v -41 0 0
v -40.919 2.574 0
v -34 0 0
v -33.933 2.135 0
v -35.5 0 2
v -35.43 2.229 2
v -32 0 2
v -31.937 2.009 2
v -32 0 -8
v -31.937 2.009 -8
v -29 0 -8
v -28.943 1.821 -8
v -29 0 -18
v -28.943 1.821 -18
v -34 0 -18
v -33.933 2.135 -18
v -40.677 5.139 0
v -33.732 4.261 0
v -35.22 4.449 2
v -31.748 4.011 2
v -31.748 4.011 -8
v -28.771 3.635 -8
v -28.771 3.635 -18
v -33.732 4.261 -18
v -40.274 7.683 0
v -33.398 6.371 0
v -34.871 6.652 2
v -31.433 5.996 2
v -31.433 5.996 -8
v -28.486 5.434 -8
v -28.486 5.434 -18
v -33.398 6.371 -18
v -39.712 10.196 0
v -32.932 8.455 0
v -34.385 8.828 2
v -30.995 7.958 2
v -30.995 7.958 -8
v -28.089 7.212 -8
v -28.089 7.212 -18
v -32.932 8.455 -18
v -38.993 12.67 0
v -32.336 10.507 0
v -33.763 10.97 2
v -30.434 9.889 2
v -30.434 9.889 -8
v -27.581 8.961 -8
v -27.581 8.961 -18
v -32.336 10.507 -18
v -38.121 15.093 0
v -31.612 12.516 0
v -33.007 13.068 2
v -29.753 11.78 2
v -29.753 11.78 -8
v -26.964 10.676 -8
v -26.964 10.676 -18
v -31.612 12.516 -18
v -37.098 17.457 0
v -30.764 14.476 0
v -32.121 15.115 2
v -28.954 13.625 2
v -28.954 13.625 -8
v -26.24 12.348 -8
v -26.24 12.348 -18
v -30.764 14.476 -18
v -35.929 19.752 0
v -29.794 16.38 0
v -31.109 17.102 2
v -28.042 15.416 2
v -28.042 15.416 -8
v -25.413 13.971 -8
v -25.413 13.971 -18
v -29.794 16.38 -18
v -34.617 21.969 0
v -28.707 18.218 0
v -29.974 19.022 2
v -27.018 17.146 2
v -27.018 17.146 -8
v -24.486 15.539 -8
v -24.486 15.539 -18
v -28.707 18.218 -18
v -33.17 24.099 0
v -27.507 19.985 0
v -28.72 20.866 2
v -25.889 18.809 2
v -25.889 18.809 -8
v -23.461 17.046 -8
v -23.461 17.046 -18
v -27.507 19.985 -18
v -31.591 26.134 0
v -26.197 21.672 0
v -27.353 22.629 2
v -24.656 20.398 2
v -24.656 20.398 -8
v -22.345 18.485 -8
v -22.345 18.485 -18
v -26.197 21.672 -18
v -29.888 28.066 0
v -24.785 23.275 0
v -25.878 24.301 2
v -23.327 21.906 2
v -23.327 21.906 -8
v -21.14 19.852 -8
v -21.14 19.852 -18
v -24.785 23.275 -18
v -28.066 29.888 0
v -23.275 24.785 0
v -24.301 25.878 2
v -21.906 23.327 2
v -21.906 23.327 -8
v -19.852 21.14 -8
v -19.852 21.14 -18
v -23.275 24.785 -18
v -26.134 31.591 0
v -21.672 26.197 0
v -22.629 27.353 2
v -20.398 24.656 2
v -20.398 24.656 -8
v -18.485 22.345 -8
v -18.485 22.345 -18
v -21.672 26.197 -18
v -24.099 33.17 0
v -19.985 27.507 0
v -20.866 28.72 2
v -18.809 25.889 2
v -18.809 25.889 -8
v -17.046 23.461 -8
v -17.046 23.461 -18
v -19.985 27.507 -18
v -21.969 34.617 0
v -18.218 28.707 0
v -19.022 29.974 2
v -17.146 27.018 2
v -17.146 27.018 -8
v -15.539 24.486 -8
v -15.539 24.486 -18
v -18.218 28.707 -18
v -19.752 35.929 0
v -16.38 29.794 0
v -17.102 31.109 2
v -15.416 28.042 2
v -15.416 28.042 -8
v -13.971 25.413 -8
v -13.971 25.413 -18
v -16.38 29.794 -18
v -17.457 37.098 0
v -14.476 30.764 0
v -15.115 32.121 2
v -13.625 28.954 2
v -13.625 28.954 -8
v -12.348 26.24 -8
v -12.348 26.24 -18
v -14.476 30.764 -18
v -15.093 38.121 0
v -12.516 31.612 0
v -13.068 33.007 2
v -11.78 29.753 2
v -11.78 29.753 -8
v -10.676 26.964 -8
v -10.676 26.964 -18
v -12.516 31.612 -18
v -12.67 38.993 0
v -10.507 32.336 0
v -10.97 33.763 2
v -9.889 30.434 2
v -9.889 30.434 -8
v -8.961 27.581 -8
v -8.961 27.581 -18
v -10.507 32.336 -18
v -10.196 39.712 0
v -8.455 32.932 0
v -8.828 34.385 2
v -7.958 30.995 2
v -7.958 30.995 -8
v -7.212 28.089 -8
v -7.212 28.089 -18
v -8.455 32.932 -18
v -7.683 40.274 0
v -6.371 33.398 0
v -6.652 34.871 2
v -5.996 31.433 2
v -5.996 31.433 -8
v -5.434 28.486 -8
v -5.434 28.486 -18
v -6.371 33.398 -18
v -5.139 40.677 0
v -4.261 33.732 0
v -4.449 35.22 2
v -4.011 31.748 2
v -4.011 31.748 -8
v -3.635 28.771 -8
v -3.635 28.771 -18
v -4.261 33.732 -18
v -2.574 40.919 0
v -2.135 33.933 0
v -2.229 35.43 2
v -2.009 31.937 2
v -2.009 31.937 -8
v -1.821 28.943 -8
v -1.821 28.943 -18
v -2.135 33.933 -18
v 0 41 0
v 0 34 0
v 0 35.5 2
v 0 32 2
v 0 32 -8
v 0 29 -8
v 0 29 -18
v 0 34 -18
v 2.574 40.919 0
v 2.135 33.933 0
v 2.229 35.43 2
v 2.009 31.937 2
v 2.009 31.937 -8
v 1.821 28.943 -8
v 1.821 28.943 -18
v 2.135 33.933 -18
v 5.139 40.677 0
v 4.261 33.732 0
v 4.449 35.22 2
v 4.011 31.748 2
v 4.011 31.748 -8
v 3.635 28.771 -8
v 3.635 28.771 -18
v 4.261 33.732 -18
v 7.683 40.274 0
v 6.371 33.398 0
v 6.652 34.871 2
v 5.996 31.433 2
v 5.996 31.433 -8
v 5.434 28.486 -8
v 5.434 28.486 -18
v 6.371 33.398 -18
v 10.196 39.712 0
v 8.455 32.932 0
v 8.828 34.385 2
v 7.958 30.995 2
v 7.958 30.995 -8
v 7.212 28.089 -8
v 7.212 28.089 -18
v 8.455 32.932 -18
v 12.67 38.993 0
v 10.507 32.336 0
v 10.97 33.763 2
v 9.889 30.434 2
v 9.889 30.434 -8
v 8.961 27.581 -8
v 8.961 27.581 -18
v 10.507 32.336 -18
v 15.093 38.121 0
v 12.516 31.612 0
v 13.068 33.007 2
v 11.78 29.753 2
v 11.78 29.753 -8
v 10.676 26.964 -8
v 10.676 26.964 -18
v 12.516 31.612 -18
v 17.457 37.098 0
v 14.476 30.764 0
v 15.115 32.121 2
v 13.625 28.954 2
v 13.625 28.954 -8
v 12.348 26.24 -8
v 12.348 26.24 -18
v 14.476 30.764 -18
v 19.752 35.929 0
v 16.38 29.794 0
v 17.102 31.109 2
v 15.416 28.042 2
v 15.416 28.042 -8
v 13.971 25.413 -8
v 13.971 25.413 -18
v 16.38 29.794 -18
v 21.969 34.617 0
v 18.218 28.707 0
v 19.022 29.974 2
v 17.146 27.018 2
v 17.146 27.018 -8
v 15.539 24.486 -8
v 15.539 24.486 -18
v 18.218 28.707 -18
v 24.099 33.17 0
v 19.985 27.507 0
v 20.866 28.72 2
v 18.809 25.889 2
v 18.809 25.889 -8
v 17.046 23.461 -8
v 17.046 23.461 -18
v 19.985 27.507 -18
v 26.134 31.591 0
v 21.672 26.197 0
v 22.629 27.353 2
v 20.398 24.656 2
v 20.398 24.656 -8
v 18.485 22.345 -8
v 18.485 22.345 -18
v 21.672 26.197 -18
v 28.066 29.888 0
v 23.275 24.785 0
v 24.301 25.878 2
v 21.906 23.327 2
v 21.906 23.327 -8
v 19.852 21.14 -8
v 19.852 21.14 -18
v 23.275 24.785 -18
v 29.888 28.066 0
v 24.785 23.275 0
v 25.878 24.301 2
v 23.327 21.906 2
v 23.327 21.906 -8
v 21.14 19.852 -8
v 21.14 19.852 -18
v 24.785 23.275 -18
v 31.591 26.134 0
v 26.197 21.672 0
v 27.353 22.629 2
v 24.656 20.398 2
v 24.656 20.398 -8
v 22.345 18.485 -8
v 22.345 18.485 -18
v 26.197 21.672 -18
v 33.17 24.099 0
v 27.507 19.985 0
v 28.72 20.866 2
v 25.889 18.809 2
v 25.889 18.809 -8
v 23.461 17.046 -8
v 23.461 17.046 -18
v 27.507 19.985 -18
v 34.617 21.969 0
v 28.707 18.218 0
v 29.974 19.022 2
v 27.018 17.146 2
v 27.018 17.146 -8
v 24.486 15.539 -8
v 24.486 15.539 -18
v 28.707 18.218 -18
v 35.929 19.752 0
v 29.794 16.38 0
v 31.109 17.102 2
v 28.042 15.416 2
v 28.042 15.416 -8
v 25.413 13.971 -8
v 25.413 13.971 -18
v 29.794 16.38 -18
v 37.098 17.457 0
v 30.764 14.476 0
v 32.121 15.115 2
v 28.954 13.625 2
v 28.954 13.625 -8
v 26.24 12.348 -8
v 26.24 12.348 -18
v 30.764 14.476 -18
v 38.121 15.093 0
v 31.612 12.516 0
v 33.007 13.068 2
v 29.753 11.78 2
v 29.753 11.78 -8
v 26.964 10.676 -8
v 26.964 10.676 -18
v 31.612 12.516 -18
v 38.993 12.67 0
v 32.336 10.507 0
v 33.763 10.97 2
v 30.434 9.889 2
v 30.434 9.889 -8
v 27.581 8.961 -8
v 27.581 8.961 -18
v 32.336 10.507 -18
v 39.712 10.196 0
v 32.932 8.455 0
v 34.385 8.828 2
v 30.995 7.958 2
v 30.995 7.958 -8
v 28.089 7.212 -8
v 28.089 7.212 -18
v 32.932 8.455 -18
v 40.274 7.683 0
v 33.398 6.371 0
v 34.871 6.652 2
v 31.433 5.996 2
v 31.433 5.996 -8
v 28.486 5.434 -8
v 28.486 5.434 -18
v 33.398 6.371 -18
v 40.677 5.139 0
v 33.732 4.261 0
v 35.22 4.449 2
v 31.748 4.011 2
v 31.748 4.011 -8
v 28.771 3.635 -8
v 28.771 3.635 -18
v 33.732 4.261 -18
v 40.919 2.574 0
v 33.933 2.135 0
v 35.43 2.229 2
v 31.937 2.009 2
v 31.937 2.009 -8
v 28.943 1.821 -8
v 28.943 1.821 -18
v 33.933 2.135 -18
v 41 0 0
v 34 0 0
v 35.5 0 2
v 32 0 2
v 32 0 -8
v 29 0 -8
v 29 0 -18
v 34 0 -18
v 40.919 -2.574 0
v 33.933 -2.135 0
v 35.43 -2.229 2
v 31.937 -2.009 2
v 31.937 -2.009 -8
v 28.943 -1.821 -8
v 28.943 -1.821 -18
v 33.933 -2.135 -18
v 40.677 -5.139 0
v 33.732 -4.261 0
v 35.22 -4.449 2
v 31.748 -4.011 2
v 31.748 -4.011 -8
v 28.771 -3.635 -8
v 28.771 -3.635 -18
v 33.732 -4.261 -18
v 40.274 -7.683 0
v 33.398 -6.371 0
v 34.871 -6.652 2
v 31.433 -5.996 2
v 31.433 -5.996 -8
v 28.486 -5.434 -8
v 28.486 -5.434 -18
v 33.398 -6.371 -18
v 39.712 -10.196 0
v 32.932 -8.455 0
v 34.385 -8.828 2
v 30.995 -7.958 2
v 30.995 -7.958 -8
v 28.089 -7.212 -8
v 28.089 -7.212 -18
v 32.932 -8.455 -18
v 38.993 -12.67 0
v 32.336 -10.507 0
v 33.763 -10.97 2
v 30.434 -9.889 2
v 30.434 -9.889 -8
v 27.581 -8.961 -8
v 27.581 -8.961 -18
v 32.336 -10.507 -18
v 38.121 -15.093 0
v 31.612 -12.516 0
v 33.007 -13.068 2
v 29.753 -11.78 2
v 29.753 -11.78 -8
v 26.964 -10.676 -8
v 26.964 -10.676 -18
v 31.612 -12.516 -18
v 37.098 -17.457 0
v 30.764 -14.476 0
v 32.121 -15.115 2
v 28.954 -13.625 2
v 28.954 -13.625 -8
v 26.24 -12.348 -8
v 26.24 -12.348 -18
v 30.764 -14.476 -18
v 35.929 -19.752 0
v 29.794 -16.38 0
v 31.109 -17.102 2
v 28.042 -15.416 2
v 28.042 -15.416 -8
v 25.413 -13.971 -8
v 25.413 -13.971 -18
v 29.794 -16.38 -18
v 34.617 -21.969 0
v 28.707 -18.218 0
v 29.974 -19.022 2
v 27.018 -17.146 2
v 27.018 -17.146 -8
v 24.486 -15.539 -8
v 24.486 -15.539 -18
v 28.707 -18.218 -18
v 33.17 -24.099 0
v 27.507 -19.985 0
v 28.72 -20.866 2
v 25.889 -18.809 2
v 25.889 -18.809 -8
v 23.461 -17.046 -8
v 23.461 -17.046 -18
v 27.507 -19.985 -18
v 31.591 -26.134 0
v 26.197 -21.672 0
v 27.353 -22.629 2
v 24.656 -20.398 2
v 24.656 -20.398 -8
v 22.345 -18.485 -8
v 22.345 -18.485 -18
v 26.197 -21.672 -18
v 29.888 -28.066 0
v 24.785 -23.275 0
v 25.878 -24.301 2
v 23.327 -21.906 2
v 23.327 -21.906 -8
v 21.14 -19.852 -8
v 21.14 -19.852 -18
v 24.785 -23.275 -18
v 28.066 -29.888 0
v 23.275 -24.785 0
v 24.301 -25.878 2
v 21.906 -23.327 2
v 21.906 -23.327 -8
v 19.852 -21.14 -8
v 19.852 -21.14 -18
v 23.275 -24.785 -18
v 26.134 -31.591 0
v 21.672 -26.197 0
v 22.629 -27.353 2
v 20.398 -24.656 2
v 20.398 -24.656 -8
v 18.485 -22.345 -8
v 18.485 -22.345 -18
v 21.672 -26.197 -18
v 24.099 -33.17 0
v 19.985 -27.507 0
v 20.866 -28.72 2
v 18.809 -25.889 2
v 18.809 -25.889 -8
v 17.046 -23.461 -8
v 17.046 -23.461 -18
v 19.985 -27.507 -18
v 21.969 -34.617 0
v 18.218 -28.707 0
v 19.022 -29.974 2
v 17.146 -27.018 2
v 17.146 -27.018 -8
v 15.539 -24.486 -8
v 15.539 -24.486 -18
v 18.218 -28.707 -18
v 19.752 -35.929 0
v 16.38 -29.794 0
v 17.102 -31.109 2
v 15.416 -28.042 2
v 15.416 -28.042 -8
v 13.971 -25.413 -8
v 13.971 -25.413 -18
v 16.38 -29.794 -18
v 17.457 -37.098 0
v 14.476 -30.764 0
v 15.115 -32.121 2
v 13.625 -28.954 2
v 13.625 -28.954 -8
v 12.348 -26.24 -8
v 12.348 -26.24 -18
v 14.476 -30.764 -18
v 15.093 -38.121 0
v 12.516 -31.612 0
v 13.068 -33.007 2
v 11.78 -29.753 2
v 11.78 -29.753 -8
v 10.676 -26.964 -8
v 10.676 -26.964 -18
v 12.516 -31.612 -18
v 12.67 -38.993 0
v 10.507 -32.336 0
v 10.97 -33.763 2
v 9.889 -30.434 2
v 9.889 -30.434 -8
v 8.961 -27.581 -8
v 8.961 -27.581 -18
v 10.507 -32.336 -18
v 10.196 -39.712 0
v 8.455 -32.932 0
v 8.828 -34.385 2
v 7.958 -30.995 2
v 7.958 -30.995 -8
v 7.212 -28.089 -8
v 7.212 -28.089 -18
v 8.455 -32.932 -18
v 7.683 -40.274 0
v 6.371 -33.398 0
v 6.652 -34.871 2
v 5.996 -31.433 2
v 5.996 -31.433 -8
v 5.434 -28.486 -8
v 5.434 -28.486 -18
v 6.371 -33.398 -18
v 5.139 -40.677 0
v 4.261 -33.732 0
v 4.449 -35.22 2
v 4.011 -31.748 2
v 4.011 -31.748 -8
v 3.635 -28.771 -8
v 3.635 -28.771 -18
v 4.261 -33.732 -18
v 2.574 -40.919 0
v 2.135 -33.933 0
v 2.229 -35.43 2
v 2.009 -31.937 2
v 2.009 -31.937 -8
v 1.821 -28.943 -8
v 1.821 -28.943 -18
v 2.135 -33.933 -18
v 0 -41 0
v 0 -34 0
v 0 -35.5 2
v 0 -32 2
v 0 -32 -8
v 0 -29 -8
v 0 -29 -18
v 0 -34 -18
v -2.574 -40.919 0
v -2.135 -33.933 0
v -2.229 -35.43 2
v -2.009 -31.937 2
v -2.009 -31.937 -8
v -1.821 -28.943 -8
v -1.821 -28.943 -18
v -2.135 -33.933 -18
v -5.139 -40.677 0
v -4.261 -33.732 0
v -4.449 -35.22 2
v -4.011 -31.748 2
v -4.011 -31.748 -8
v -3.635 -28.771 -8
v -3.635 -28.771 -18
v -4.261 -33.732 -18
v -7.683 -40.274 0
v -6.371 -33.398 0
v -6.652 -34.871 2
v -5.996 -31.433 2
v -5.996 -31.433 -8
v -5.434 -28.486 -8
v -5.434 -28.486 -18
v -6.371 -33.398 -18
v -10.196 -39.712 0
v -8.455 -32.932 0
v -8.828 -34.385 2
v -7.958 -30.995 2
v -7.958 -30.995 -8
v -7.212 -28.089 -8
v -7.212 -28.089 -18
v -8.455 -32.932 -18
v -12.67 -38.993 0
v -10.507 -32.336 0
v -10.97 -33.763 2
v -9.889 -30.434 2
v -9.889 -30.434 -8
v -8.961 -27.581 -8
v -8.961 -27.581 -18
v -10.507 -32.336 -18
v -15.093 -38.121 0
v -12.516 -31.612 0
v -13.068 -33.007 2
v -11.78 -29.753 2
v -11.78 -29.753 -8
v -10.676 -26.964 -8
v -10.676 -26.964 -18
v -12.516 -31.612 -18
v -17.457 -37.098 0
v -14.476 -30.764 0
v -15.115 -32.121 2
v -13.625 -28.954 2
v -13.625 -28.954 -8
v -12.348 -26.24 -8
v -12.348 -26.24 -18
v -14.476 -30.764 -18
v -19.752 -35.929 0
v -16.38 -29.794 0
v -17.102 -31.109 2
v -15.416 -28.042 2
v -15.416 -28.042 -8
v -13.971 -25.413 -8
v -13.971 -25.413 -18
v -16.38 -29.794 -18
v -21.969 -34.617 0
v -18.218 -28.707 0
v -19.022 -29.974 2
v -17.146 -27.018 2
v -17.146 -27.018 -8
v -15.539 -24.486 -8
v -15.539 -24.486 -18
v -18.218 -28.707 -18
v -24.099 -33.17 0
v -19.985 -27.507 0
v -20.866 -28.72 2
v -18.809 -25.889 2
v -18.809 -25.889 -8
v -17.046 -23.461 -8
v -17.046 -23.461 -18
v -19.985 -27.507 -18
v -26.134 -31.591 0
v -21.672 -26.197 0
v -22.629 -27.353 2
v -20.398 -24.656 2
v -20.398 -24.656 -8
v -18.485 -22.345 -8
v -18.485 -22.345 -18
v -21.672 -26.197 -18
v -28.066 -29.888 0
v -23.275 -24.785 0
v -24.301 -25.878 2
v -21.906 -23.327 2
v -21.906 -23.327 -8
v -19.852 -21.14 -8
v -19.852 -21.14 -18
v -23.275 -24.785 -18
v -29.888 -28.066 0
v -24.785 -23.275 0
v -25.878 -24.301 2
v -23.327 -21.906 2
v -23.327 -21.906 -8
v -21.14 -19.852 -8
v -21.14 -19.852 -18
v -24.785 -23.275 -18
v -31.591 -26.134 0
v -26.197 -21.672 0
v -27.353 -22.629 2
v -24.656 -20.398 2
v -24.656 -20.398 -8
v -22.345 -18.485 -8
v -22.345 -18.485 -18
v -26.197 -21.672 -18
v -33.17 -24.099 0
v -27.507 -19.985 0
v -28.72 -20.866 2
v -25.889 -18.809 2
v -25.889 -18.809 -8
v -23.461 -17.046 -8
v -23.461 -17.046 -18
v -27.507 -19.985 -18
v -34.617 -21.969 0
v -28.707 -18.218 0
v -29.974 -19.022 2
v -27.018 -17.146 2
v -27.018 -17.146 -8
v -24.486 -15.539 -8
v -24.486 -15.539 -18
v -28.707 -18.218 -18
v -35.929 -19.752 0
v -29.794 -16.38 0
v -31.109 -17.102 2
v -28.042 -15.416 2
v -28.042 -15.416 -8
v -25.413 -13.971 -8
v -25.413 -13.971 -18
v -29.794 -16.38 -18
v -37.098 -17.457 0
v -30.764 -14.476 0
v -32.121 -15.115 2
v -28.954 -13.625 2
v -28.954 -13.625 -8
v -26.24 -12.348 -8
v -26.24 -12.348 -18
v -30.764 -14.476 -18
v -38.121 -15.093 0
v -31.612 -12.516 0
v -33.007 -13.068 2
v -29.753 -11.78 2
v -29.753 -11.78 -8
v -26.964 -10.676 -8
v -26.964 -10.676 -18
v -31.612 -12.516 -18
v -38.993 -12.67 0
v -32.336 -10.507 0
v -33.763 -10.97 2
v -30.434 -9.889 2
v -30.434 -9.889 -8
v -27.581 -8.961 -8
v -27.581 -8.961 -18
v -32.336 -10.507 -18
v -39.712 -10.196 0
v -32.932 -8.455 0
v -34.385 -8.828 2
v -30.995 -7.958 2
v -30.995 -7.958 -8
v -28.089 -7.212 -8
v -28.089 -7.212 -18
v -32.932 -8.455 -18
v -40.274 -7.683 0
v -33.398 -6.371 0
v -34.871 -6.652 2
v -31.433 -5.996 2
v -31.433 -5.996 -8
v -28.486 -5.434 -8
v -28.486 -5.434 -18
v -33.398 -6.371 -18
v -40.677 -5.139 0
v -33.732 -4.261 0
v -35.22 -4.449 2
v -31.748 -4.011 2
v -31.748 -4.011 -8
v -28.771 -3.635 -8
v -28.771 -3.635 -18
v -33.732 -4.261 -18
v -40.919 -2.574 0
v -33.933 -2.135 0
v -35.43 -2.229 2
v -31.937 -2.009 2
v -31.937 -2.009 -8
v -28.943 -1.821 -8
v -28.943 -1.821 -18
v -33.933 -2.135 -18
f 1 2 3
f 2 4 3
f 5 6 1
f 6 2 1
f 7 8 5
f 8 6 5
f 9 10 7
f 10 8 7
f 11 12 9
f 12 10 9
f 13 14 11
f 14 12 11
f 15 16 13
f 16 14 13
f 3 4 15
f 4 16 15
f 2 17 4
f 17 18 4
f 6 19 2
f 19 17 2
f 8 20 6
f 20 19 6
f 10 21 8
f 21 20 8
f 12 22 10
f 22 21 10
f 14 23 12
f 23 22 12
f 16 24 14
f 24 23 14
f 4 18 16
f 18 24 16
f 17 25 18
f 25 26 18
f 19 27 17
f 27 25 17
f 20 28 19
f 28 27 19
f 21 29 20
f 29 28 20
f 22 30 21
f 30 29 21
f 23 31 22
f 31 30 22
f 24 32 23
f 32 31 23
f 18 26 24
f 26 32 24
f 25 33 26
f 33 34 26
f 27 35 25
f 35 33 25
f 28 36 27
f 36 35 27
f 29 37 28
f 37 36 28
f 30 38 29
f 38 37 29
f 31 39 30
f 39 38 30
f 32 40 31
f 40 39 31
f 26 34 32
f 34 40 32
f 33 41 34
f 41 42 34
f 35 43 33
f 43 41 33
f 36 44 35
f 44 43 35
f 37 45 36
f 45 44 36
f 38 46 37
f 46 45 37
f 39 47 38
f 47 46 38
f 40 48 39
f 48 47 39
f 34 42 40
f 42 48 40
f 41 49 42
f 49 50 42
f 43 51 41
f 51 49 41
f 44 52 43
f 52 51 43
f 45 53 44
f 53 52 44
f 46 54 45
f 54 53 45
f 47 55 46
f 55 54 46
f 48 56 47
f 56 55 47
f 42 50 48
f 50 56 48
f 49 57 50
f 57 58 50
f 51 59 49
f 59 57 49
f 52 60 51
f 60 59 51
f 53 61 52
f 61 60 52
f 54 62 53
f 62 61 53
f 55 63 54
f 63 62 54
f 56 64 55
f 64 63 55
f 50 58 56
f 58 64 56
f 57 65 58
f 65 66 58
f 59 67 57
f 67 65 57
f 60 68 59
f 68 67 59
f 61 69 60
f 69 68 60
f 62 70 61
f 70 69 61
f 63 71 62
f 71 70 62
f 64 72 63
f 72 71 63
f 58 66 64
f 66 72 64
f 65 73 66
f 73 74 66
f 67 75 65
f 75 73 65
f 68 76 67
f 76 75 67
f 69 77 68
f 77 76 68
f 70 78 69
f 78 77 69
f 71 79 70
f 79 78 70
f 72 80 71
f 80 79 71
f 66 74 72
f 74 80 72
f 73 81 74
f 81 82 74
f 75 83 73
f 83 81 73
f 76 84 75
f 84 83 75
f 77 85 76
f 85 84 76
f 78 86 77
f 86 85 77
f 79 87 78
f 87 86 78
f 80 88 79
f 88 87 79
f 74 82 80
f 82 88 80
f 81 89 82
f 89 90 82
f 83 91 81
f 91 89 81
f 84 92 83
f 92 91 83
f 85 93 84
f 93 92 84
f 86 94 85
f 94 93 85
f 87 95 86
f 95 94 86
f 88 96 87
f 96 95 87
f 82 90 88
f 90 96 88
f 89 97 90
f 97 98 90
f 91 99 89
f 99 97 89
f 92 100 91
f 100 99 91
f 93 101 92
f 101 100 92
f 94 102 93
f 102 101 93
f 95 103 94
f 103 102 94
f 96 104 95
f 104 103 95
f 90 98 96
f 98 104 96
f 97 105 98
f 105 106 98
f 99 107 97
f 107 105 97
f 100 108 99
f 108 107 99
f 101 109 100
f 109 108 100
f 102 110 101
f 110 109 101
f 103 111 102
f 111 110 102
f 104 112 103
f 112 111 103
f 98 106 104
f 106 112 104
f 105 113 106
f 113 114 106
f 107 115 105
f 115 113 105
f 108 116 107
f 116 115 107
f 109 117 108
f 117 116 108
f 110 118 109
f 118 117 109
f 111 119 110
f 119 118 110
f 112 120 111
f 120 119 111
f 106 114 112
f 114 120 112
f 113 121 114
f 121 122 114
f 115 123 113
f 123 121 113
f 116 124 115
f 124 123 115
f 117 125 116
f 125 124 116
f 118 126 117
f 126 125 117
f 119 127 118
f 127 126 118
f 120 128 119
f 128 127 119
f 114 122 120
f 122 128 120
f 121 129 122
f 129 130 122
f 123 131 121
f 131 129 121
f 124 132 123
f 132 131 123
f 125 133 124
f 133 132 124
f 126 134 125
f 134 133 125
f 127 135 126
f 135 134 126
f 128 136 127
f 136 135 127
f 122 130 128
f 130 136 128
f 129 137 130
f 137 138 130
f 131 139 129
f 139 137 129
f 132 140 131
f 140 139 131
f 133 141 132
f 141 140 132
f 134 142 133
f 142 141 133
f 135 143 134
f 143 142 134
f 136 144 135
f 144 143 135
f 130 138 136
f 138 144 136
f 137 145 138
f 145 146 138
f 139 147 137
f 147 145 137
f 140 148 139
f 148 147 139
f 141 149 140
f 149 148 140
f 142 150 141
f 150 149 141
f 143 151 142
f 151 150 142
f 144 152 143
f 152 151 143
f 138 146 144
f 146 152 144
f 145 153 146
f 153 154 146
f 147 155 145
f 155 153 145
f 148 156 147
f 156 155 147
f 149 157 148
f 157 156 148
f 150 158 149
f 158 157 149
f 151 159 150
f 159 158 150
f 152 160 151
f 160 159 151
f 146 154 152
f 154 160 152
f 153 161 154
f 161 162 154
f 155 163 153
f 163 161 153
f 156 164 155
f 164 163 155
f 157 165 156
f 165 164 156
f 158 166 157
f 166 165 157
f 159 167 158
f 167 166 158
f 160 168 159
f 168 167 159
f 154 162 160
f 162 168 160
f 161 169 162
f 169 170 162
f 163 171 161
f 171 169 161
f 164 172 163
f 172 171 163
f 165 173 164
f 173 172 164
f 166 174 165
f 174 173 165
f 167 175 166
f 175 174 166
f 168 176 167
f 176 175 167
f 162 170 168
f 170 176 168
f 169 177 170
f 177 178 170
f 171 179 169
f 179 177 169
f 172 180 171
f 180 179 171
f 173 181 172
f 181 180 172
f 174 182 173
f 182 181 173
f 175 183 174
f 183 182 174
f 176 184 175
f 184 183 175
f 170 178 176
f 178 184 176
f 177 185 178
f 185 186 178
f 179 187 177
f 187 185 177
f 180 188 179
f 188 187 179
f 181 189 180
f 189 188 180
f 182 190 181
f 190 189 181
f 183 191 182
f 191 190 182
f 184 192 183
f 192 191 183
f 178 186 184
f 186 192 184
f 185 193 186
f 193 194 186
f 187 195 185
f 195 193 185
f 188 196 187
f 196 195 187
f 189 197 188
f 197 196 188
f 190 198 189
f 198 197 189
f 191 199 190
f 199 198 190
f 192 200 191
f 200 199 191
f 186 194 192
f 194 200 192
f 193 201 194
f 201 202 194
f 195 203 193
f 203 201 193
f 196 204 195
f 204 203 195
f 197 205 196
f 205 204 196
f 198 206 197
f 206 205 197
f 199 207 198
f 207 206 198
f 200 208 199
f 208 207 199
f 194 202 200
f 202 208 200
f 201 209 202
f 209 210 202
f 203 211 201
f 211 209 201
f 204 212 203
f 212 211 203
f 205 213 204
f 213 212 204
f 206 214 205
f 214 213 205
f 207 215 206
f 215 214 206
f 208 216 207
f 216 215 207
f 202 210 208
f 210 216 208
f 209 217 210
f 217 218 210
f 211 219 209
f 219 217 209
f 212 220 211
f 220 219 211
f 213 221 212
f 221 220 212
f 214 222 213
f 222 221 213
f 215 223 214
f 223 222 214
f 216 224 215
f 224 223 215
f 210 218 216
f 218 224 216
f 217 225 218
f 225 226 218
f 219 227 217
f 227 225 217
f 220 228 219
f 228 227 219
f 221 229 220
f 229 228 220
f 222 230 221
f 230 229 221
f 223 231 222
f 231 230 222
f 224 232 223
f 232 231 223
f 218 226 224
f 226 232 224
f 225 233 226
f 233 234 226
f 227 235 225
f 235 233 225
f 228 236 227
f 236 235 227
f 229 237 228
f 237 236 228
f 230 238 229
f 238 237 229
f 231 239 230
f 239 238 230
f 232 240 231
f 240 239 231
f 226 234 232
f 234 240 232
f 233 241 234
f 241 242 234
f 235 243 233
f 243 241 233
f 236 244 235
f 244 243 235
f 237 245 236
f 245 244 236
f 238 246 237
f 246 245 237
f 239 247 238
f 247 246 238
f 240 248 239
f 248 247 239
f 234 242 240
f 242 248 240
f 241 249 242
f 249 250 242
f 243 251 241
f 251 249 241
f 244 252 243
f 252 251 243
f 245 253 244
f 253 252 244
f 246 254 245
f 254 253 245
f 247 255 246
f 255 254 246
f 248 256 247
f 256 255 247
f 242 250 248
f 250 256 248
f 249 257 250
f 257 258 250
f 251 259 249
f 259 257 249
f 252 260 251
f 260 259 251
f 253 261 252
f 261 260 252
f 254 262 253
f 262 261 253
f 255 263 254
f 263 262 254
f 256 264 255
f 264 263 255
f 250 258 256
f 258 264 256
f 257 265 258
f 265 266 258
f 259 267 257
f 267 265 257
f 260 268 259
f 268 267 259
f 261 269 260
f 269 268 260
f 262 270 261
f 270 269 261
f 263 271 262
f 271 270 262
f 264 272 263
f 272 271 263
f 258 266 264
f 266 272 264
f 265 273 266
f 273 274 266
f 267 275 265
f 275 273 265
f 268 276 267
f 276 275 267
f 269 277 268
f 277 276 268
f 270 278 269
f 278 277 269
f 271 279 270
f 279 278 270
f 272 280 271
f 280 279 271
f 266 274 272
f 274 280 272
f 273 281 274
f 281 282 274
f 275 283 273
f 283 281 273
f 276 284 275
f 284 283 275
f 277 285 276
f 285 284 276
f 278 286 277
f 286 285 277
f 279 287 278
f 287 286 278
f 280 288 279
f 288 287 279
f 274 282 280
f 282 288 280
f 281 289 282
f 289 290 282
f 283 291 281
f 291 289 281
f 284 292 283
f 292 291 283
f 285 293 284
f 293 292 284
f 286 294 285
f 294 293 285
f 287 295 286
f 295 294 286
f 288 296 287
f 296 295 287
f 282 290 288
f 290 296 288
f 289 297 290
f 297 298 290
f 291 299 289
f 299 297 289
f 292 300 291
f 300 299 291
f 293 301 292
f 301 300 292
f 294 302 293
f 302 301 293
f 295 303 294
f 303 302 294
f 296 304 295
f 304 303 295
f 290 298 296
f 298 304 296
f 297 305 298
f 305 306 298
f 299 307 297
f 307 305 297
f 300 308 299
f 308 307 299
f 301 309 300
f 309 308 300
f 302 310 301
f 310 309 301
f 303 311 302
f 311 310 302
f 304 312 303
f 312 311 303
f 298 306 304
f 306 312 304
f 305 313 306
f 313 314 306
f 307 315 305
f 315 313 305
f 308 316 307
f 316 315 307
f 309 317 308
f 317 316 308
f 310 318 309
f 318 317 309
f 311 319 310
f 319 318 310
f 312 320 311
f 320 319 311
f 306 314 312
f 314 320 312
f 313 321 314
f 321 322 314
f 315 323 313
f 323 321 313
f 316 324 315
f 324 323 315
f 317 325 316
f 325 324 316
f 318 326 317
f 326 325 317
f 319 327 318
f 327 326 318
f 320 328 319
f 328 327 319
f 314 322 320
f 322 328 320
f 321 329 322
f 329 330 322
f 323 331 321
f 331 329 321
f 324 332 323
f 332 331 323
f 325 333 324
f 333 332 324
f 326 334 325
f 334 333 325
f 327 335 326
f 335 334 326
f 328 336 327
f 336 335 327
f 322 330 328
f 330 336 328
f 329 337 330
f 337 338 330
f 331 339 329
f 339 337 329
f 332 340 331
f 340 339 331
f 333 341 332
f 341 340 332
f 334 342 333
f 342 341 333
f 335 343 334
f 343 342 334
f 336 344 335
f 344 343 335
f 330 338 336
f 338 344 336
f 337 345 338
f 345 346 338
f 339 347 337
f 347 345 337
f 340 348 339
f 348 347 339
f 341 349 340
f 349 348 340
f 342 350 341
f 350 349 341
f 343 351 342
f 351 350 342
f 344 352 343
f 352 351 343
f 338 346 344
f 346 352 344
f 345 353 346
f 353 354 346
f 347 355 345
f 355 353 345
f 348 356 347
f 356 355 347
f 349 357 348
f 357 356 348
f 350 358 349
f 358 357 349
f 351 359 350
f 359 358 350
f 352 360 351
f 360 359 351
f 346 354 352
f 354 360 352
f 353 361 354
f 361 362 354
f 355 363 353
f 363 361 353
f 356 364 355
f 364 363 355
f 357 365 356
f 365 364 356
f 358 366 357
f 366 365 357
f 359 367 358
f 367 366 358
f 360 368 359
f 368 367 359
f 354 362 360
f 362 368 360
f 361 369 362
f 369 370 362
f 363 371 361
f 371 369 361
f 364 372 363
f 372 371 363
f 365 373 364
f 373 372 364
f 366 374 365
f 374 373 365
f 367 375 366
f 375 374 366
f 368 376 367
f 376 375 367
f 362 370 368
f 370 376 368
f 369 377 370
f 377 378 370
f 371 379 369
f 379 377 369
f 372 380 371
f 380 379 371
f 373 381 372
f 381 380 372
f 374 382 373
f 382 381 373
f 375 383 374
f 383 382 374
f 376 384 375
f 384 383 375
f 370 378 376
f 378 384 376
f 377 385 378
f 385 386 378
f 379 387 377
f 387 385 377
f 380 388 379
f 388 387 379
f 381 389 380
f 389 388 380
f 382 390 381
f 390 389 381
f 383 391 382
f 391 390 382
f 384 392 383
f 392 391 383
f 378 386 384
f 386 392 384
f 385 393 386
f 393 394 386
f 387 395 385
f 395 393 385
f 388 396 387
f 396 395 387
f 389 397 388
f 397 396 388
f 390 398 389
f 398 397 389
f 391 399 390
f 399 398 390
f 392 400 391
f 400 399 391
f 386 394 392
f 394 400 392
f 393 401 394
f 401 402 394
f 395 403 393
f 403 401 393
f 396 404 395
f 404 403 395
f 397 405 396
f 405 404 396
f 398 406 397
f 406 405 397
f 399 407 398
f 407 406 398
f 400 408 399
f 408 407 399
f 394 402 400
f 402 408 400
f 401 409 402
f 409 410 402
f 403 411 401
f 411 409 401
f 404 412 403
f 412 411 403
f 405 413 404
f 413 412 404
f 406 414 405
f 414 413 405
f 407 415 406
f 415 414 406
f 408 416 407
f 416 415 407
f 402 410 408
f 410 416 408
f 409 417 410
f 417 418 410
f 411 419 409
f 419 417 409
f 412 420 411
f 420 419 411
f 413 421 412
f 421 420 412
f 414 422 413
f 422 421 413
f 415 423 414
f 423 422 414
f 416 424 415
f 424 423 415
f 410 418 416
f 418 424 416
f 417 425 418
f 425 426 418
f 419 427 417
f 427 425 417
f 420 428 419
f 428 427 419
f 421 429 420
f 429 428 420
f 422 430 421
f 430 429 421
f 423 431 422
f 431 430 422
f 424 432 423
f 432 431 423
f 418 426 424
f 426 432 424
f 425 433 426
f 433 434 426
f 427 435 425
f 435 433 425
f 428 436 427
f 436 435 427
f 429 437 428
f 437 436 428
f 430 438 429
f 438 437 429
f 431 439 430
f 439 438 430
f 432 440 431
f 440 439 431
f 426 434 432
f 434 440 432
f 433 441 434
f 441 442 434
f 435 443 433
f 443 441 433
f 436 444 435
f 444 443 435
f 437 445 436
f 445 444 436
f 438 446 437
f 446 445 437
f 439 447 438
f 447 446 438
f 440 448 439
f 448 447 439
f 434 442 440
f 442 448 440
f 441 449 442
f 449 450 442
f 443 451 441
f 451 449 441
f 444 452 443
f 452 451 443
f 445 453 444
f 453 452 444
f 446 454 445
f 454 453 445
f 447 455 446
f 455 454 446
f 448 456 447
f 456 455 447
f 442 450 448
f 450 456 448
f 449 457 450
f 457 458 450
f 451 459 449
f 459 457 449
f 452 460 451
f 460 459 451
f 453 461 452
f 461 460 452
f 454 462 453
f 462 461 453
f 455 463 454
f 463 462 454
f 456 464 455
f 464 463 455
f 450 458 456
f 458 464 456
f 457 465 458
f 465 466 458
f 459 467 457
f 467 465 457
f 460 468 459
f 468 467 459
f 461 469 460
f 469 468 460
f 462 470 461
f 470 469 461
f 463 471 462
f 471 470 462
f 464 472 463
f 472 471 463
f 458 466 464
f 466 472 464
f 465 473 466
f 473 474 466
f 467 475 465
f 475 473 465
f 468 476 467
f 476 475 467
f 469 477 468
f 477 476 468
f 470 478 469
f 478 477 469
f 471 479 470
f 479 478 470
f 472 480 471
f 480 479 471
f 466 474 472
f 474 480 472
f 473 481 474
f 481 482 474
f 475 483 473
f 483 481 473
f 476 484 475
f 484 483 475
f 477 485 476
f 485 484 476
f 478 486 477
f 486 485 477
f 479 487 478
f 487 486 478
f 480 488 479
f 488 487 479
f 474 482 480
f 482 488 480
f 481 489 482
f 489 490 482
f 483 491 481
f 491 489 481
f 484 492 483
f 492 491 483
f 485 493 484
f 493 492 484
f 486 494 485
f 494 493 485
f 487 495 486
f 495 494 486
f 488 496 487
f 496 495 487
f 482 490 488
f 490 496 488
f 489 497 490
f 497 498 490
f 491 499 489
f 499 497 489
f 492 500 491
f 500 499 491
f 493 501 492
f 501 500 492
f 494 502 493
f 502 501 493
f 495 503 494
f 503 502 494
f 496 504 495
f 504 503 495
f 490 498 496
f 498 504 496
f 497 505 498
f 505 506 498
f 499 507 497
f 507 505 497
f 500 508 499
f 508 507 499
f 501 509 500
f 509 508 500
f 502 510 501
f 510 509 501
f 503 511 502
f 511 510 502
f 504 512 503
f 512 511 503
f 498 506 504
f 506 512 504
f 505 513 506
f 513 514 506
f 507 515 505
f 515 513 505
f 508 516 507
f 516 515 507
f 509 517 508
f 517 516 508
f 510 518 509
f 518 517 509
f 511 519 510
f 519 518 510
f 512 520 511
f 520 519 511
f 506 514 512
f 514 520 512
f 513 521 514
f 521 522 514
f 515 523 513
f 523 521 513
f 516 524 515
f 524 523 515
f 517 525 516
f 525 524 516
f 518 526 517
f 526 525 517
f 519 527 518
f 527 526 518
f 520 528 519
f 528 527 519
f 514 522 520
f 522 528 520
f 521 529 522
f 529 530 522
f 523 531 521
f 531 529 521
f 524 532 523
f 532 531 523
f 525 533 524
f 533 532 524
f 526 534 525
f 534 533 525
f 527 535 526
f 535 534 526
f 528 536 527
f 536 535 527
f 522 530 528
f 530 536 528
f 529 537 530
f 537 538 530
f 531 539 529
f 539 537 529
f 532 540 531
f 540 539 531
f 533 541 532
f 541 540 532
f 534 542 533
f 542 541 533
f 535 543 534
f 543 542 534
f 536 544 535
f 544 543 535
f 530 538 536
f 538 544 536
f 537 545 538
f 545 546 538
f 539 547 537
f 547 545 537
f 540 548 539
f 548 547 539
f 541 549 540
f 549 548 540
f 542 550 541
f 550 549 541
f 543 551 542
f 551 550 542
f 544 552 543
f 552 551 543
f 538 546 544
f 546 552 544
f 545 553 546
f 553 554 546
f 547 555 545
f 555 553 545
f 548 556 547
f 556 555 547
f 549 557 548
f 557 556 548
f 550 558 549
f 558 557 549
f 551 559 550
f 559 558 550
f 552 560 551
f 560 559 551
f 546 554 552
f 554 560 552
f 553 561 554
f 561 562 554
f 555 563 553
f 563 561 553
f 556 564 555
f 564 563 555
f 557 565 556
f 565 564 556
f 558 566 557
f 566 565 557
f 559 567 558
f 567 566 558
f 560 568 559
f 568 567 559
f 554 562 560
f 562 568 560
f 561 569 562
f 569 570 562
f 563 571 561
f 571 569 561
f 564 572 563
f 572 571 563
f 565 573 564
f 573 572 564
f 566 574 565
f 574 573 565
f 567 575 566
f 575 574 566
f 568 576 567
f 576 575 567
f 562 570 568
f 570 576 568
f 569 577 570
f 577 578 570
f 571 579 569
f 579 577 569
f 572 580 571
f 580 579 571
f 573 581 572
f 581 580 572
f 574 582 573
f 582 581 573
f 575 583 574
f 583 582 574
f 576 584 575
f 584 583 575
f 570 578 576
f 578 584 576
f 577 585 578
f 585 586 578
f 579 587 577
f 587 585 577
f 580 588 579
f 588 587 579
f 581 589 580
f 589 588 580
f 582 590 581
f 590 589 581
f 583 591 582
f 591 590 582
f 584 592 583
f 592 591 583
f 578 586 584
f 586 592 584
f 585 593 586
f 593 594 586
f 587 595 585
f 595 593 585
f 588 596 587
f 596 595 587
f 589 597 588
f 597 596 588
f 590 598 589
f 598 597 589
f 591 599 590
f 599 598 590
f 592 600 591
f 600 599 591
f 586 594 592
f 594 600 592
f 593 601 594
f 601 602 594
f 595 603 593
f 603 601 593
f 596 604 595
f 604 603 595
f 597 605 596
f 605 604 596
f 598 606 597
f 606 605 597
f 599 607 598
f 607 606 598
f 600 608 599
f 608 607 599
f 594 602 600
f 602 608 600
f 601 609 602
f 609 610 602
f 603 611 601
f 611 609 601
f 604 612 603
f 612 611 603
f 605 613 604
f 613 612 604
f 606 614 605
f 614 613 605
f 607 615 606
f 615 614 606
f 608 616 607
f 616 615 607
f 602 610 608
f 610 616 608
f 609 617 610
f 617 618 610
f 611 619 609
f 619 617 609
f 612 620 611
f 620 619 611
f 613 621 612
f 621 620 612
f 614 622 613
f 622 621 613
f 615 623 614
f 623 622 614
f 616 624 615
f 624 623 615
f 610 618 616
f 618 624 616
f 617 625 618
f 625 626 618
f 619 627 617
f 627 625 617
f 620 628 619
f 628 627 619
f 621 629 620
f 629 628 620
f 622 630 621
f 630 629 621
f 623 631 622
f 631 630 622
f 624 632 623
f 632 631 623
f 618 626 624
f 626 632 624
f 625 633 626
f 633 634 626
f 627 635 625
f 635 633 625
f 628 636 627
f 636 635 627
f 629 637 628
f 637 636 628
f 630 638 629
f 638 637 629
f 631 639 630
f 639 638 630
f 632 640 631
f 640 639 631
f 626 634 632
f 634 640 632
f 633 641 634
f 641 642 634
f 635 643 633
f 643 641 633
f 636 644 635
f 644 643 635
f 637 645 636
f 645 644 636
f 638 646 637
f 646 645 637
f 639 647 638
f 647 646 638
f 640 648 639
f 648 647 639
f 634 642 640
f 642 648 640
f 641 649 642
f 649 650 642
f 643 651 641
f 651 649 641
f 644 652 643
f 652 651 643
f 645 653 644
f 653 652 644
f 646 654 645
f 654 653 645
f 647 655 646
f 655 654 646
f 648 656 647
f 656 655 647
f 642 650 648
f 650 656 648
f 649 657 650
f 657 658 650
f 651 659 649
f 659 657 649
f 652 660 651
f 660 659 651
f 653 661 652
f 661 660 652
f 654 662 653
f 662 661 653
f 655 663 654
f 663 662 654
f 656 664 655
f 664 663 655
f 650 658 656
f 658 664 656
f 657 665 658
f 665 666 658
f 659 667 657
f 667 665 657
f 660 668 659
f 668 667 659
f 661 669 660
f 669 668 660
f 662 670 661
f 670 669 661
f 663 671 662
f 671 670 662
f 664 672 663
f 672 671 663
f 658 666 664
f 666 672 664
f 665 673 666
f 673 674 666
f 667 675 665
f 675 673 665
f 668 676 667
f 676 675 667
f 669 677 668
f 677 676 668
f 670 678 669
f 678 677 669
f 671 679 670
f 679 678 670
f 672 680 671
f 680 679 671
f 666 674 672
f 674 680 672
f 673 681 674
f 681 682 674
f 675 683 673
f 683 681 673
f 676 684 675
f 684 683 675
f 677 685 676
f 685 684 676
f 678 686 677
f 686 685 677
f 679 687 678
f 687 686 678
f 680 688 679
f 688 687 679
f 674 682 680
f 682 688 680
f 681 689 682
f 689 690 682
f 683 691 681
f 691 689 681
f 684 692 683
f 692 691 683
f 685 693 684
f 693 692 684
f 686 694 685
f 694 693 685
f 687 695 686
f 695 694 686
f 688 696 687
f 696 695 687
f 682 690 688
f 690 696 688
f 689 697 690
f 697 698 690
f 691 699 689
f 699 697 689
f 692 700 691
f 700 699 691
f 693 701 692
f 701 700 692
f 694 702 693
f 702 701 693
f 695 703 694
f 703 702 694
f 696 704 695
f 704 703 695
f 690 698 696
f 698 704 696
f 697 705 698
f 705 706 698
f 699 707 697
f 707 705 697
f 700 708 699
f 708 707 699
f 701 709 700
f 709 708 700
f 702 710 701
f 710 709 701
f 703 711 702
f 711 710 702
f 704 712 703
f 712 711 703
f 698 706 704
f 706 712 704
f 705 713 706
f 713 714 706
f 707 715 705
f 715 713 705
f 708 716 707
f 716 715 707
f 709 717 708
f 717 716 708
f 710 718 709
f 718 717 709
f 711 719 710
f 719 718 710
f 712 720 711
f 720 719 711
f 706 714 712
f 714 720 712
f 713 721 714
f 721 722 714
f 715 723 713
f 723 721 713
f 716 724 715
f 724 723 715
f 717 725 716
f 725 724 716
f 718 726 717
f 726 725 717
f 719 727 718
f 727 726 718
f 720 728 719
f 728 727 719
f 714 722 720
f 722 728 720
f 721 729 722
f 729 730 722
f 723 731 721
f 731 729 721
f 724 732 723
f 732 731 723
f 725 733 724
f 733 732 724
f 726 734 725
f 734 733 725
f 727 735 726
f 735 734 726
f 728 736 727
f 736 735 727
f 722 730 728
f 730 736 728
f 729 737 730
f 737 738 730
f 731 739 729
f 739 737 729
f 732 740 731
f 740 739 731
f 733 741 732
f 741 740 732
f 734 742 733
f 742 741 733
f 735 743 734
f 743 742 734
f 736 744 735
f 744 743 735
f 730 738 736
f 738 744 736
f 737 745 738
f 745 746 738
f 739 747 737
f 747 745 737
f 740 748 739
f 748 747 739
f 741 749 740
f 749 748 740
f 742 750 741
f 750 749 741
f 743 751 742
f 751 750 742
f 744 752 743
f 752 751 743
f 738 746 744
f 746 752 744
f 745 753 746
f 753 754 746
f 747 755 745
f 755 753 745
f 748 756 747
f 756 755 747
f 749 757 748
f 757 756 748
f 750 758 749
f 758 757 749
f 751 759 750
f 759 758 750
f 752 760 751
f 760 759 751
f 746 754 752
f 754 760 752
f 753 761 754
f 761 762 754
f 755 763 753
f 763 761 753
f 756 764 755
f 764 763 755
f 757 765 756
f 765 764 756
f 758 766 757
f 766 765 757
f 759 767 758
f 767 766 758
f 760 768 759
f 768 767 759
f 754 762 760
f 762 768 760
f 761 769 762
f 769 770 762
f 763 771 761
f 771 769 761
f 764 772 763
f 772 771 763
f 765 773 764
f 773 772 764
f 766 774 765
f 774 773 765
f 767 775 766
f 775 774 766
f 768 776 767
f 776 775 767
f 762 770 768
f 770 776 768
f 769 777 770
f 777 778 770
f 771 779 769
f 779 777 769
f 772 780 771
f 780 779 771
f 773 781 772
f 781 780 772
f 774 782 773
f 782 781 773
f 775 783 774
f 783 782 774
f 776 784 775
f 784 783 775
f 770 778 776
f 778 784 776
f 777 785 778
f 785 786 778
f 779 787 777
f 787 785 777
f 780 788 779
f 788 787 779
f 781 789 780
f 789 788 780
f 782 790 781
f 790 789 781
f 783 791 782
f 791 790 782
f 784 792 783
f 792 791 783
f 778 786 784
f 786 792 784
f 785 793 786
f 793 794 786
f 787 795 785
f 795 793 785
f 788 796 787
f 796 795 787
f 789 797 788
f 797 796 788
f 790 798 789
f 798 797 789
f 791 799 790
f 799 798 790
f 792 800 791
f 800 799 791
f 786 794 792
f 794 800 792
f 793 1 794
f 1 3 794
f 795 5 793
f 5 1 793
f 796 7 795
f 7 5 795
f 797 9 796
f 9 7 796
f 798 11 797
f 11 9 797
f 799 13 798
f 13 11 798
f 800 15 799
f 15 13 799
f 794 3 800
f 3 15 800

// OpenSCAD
$fn = 100;

function inset_dia(actual_hole_dia=115, overshoot_into_hole=2) = actual_hole_dia-(overshoot_into_hole*2);
function inset_height() = 10;
function inset_step() = 3;


module base_shape_2d(actual_hole_dia=115,
                     covering_dist=15,
                     step_width=3,
                     step_height=10,
                     overshoot_height=2,
                     wall_thick=20,
                     plateau_width=8,
                     overshoot_into_hole=2) {
    actual_hole_rad = actual_hole_dia / 2;
    translate([actual_hole_rad,0])
    polygon([
             // Initial slope up to plateau
             [covering_dist,0],
             [plateau_width-overshoot_into_hole, overshoot_height],
             // Plateau
             [-overshoot_into_hole,overshoot_height],
             // Step
             [-overshoot_into_hole,overshoot_height-step_height],
             [-step_width-overshoot_into_hole, overshoot_height-step_height],
             // Hole thingi
             [-step_width-overshoot_into_hole, -wall_thick],
             [0, -wall_thick],
             [0, 0],
            ]);
            
}

module shape(wall_thick=20, hole_dia=115, covering_dist=15) {
    rotate_extrude() base_shape_2d(wall_thick=wall_thick, actual_hole_dia=hole_dia, covering_dist=covering_dist, plateau_width=covering_dist/2);
}

// projection(cut=true)
// translate([0,0,1])
// shape();
// 
// translate([0, 160])
// projection(cut=true)
// shape();

//projection(cut=true)
//translate([0,0,20])
//shape();

shape(wall_thick=18, hole_dia=68, covering_dist=7);
